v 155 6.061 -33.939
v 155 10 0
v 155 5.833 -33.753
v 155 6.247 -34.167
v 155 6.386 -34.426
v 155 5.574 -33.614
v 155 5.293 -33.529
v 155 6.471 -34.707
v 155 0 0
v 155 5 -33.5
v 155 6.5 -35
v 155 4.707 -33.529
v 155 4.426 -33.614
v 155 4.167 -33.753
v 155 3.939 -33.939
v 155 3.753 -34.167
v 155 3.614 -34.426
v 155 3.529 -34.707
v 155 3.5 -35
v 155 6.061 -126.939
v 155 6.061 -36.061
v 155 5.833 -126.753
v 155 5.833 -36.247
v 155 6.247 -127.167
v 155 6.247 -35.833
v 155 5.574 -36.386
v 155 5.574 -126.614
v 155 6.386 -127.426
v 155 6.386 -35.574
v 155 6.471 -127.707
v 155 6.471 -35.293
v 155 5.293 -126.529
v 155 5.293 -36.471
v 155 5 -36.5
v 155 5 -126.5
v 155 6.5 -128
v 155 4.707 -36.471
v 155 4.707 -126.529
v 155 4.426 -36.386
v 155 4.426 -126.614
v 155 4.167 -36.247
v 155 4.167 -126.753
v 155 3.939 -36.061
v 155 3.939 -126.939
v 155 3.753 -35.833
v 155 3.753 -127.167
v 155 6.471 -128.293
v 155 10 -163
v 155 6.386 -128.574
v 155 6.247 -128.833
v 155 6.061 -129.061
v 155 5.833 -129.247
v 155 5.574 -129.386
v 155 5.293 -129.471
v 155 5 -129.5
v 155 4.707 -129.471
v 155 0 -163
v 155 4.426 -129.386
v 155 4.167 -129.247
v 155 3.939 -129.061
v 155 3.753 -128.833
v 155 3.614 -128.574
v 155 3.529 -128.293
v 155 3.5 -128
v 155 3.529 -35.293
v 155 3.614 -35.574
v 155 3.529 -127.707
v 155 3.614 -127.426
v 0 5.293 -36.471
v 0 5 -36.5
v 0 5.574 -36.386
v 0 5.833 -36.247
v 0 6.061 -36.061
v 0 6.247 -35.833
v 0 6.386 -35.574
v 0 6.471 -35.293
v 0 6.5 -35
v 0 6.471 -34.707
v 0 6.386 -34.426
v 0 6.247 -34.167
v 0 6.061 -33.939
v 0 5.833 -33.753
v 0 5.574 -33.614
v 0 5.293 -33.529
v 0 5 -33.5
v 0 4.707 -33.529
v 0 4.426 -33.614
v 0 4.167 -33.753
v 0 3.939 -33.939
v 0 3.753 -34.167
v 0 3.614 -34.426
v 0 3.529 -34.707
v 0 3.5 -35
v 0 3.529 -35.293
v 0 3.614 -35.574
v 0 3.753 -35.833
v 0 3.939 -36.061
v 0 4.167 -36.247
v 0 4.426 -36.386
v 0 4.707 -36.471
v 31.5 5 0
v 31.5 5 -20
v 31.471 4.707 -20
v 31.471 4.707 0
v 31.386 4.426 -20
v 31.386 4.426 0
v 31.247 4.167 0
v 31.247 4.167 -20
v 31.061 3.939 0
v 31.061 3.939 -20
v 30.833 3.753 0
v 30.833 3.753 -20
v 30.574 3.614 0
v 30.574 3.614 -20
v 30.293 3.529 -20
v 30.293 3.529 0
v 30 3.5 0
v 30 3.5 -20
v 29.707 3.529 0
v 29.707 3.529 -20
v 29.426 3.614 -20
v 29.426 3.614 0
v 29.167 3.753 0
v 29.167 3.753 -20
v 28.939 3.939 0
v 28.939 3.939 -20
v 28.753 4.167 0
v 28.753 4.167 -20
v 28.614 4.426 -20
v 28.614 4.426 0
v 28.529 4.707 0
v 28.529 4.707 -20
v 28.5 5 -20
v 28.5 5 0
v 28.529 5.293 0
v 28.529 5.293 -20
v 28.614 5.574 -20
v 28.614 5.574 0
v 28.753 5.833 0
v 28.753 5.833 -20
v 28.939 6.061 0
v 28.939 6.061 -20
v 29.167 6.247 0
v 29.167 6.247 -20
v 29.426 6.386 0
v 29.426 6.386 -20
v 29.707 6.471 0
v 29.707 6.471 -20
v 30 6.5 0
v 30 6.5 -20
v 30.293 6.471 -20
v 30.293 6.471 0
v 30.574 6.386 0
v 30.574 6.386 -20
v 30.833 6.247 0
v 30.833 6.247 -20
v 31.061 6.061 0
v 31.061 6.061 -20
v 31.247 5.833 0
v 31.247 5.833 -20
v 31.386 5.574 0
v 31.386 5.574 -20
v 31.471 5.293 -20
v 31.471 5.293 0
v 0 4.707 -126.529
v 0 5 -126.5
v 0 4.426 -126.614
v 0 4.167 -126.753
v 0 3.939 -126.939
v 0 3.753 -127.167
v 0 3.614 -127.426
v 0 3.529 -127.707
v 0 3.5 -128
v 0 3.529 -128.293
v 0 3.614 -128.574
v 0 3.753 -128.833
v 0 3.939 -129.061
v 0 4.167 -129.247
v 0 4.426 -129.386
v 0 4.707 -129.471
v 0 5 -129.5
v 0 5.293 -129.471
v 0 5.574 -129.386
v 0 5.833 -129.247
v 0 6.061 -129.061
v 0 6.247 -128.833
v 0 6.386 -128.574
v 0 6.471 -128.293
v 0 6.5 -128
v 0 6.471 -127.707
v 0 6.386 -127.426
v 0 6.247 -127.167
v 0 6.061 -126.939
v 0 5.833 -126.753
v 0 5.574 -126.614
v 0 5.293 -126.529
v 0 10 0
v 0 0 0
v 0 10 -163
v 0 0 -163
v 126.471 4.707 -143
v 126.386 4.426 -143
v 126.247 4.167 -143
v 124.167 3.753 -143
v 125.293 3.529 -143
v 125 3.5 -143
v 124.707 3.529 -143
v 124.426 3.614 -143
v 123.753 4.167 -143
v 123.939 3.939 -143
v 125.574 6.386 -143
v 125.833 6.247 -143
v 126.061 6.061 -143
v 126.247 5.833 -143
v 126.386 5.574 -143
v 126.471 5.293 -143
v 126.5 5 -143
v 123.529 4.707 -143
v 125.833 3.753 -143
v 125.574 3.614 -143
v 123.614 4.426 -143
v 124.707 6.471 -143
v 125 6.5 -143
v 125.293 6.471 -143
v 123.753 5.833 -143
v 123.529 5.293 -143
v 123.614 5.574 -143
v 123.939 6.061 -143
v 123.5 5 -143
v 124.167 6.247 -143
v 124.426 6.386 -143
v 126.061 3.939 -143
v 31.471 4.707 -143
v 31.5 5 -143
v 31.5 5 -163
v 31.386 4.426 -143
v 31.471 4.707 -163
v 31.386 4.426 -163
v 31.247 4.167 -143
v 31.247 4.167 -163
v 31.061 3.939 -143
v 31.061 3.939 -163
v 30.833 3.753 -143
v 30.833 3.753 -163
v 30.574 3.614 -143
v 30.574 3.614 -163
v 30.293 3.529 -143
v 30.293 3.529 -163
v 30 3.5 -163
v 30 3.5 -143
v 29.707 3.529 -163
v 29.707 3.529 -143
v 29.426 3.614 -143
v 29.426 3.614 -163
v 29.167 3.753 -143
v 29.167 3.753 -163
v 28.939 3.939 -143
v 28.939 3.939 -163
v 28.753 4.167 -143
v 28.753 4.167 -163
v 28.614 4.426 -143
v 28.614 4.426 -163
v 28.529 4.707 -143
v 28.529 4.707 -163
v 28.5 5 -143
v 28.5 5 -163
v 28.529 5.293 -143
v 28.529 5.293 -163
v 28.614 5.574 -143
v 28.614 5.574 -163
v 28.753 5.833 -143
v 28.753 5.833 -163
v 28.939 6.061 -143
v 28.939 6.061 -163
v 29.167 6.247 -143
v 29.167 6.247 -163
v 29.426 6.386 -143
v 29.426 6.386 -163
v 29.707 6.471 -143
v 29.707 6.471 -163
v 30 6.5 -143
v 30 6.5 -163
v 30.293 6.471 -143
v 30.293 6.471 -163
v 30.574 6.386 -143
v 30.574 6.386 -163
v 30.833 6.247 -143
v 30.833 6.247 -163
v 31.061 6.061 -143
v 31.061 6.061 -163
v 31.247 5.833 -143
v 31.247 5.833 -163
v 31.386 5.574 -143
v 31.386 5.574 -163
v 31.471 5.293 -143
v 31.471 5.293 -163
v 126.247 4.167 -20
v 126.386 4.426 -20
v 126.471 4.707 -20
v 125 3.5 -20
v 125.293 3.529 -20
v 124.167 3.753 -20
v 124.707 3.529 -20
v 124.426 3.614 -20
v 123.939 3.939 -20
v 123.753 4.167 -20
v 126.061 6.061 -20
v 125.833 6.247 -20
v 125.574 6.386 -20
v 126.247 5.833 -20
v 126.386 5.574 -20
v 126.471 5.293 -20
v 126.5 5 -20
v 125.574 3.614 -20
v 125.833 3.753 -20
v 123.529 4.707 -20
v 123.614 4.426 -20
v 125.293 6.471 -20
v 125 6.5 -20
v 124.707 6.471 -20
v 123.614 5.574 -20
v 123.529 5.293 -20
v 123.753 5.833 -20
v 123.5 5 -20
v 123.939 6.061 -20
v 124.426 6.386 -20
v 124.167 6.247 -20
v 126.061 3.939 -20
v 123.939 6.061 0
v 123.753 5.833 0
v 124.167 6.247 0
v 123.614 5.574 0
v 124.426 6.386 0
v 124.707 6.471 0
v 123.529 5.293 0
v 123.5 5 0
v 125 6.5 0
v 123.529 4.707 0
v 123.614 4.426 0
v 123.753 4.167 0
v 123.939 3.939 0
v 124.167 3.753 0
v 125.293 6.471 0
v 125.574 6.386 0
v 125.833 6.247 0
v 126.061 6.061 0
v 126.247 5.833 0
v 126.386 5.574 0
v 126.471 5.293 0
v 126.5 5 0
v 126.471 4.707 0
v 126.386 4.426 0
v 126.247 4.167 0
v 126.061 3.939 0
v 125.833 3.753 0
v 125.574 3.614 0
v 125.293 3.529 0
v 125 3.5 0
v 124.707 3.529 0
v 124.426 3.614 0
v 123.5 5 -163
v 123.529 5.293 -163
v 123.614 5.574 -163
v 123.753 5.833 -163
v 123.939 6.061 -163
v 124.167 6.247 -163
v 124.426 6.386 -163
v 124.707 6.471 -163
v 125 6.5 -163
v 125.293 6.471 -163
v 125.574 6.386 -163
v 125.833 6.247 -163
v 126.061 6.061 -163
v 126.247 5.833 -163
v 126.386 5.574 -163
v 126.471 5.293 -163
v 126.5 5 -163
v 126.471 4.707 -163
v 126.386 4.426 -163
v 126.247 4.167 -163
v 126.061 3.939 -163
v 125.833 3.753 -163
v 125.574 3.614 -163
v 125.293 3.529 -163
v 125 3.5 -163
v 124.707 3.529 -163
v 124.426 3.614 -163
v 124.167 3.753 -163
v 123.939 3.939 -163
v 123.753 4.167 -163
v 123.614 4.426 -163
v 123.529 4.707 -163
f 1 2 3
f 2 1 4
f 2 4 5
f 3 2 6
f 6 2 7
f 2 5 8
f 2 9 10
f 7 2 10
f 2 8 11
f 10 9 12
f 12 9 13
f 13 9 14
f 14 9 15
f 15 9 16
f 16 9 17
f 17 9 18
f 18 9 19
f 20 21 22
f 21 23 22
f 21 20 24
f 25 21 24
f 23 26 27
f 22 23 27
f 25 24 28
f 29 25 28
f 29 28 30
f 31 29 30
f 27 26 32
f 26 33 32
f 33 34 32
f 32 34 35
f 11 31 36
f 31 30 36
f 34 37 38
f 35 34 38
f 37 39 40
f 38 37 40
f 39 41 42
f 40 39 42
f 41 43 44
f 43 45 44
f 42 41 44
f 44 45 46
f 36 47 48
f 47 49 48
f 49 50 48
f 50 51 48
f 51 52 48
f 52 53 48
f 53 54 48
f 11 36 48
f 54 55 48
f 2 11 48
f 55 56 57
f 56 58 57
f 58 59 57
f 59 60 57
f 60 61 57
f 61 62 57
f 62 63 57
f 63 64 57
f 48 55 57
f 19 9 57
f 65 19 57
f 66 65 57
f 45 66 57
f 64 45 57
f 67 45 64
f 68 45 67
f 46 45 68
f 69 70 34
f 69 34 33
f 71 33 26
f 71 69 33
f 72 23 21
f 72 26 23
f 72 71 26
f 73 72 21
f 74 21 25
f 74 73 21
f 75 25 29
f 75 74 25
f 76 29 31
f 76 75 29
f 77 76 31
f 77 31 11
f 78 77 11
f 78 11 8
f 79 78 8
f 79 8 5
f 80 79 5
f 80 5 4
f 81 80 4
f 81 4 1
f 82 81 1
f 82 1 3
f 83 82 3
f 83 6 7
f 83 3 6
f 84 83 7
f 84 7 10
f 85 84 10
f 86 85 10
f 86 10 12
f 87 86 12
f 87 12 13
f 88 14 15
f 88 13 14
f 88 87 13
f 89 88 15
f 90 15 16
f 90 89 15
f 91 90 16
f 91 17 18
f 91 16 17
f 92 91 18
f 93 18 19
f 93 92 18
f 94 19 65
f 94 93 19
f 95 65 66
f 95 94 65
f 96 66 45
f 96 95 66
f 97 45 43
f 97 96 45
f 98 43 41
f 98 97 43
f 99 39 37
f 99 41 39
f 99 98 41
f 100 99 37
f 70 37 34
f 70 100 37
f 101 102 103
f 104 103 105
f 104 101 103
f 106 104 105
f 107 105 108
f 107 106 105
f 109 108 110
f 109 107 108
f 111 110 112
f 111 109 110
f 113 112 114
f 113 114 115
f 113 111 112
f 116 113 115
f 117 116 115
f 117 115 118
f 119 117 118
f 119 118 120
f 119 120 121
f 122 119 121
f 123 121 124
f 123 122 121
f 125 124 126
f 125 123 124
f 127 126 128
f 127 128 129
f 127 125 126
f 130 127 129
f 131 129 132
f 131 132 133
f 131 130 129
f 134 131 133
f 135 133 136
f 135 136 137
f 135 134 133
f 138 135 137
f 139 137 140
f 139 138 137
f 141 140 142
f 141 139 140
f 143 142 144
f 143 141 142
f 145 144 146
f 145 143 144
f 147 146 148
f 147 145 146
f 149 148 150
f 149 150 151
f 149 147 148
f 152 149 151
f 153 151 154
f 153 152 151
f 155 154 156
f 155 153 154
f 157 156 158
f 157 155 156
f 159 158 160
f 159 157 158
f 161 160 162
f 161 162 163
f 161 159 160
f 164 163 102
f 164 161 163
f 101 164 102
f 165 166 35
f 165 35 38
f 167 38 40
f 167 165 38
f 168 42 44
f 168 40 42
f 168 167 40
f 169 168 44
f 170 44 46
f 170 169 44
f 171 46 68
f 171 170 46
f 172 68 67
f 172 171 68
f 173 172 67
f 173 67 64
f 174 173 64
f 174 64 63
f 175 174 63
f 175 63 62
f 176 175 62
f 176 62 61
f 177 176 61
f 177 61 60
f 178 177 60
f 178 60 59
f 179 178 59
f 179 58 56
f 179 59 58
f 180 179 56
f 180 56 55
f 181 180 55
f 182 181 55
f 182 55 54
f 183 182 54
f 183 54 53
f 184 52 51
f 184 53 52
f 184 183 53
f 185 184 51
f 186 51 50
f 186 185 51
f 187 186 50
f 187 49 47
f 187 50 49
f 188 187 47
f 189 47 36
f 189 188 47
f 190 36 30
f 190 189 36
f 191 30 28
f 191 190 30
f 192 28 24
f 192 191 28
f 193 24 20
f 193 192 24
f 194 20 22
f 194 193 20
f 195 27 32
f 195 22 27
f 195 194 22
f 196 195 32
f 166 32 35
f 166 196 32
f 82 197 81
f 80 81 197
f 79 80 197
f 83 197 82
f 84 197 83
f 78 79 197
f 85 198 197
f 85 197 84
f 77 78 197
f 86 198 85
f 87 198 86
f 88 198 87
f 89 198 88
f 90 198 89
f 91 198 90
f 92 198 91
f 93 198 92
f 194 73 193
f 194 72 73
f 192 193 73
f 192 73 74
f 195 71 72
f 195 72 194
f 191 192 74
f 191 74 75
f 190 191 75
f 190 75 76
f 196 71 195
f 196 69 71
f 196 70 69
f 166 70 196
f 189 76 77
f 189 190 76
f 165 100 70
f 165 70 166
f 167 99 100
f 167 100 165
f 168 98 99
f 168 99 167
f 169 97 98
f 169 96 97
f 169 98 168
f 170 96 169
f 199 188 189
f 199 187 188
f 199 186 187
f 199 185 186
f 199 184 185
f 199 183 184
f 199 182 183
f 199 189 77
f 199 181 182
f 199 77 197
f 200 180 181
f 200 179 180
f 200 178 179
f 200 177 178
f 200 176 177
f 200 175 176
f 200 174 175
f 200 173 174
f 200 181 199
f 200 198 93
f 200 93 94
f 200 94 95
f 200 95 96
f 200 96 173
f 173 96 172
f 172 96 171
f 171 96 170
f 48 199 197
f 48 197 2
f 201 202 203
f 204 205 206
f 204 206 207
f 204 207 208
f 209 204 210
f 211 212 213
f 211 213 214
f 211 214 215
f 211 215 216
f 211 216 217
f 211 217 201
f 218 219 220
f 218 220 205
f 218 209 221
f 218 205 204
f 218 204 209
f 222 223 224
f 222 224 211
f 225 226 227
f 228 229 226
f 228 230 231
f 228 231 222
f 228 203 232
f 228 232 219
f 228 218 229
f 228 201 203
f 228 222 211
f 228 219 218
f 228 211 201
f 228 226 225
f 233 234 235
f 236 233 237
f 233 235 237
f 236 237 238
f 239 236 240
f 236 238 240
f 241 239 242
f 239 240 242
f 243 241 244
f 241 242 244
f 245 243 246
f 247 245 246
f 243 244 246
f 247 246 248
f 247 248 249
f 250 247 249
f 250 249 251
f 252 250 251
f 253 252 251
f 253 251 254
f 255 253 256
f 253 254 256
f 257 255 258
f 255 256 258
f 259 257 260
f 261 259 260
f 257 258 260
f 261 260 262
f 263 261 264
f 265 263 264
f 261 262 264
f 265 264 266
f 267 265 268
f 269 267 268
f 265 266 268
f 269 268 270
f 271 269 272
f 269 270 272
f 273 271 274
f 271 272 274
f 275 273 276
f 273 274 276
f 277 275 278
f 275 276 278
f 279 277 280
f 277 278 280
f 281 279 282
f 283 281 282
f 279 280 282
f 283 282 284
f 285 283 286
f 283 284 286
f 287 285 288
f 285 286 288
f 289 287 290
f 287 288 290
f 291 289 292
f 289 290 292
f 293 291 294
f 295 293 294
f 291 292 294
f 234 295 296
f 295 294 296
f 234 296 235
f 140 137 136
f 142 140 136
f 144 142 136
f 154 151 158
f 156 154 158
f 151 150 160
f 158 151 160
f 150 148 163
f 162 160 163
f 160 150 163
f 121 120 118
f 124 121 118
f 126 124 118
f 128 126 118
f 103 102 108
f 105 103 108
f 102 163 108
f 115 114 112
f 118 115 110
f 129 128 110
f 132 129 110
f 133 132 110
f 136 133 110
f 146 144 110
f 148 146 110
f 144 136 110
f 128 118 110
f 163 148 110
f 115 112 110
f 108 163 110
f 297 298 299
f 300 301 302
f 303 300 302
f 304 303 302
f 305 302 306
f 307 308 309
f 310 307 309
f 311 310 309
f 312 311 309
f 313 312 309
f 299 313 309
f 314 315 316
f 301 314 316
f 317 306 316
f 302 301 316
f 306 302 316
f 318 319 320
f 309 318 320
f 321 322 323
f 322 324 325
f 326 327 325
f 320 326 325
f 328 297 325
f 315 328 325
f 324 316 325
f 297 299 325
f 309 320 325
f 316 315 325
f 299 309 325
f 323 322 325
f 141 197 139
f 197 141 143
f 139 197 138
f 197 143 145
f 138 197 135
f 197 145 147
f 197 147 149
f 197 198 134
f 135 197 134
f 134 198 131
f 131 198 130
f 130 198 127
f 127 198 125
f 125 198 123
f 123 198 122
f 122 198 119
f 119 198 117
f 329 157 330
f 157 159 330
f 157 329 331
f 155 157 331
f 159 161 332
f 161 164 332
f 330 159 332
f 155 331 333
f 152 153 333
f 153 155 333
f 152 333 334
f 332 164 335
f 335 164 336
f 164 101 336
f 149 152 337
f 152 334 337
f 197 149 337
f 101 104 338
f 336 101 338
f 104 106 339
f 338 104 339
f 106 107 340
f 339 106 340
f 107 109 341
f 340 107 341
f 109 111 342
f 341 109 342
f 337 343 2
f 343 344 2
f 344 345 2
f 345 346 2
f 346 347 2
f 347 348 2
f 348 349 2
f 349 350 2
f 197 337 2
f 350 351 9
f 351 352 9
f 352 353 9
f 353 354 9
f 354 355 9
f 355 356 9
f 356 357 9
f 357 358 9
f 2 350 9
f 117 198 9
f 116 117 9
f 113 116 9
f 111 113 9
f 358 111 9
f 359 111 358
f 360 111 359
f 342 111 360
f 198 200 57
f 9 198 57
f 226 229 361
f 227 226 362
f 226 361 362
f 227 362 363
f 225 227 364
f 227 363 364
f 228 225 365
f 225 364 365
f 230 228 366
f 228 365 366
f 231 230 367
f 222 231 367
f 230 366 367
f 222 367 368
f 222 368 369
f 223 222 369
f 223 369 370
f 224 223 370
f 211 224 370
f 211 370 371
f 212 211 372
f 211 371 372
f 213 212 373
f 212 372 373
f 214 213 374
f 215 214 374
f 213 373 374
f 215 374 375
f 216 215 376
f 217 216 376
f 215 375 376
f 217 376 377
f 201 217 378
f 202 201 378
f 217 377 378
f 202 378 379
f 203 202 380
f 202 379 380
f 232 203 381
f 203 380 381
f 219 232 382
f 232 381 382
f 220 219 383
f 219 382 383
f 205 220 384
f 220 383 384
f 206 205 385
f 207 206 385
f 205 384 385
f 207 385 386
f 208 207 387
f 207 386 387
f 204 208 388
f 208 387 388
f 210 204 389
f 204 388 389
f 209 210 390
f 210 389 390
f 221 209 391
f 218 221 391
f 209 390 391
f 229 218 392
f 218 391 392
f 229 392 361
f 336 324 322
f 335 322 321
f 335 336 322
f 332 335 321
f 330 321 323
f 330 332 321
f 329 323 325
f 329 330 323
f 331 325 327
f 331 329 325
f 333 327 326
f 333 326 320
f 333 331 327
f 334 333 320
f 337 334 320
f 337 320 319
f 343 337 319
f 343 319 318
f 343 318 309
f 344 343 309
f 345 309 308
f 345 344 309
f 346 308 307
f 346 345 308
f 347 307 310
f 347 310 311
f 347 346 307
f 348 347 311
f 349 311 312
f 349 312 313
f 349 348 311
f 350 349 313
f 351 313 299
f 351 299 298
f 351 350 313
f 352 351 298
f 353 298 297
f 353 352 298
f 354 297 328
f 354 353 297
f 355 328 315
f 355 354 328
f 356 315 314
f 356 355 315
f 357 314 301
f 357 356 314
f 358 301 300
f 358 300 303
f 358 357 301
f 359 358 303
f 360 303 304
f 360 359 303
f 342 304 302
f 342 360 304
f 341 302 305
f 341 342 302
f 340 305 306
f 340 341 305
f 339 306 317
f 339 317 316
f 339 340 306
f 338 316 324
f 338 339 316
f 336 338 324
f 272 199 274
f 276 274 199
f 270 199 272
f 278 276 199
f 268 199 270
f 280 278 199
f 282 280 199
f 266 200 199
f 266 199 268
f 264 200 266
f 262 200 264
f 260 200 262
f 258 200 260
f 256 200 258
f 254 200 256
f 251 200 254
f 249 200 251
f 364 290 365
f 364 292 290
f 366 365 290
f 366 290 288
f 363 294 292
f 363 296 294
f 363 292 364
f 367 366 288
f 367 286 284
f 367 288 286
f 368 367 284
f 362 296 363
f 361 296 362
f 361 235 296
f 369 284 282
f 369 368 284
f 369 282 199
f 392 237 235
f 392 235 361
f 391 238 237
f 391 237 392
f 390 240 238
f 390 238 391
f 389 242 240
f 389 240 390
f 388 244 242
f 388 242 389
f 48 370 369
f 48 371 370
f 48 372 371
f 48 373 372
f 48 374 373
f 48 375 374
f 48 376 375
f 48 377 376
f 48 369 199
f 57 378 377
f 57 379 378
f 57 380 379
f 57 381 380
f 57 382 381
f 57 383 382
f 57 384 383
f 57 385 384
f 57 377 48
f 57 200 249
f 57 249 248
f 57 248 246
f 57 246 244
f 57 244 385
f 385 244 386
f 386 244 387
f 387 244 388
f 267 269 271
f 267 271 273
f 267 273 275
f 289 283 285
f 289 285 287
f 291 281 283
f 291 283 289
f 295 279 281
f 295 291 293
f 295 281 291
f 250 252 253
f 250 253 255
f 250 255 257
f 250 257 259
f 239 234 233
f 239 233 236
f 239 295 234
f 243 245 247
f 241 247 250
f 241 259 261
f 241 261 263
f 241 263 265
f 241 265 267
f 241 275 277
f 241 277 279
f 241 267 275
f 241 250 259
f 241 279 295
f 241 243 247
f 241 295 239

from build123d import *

# Parameters (mm, degrees)
SKETCH1_W               = 155
SKETCH1_H               = 163
BOSS_EXTRUDE1_DEPTH     = 10
SKETCH2_R               = 1.5
CUT_EXTRUDE1_DEPTH      = 20
CUT_EXTRUDE2_DEPTH      = 226.153281122
CUT_EXTRUDE2_DEPTH_BACK = 226.153281122
SKETCH3_R               = 1.5


with BuildPart() as part:
    # Sketch1 → Boss-Extrude1 (new body)
    with BuildSketch(Plane(origin=(0, 0, 0), x_dir=(1, 0, 0), z_dir=(0, 1, 0))):
        with Locations((77.5, 81.5)):
            Rectangle(SKETCH1_W, SKETCH1_H)
    extrude(amount=BOSS_EXTRUDE1_DEPTH)

    # Sketch2 → Cut-Extrude1 (cut)
    with BuildSketch(Plane(origin=(0, 0, -163), x_dir=(-1, 0, 0), z_dir=(0, 0, -1))):
        with Locations((-125, 5)):
            Circle(SKETCH2_R)
        with Locations(Location((-30, 5, 0), (0, 0, 180))):
            Circle(SKETCH2_R)
    cut_extrude1 = extrude(amount=-CUT_EXTRUDE1_DEPTH, mode=Mode.SUBTRACT)

    # Mirror1: Cut-Extrude1 across plane
    add(cut_extrude1.mirror(Plane(origin=(0, 0, -81.5), x_dir=(1, 0, 0), z_dir=(0, 0, -1))), mode=Mode.SUBTRACT)

    # Sketch3 → Cut-Extrude2 (cut, two sides: drawn at the far end of the back side and taken through both)
    with BuildSketch(Plane(origin=(155, 0, 0), x_dir=(0, 0, -1), z_dir=(1, 0, 0)).offset(-CUT_EXTRUDE2_DEPTH_BACK)):
        with Locations((35, 5)):
            Circle(SKETCH3_R)
        with Locations(Location((128, 5, 0), (0, 0, 180))):
            Circle(SKETCH3_R)
    extrude(amount=CUT_EXTRUDE2_DEPTH + CUT_EXTRUDE2_DEPTH_BACK, mode=Mode.SUBTRACT)


solid = part.part
